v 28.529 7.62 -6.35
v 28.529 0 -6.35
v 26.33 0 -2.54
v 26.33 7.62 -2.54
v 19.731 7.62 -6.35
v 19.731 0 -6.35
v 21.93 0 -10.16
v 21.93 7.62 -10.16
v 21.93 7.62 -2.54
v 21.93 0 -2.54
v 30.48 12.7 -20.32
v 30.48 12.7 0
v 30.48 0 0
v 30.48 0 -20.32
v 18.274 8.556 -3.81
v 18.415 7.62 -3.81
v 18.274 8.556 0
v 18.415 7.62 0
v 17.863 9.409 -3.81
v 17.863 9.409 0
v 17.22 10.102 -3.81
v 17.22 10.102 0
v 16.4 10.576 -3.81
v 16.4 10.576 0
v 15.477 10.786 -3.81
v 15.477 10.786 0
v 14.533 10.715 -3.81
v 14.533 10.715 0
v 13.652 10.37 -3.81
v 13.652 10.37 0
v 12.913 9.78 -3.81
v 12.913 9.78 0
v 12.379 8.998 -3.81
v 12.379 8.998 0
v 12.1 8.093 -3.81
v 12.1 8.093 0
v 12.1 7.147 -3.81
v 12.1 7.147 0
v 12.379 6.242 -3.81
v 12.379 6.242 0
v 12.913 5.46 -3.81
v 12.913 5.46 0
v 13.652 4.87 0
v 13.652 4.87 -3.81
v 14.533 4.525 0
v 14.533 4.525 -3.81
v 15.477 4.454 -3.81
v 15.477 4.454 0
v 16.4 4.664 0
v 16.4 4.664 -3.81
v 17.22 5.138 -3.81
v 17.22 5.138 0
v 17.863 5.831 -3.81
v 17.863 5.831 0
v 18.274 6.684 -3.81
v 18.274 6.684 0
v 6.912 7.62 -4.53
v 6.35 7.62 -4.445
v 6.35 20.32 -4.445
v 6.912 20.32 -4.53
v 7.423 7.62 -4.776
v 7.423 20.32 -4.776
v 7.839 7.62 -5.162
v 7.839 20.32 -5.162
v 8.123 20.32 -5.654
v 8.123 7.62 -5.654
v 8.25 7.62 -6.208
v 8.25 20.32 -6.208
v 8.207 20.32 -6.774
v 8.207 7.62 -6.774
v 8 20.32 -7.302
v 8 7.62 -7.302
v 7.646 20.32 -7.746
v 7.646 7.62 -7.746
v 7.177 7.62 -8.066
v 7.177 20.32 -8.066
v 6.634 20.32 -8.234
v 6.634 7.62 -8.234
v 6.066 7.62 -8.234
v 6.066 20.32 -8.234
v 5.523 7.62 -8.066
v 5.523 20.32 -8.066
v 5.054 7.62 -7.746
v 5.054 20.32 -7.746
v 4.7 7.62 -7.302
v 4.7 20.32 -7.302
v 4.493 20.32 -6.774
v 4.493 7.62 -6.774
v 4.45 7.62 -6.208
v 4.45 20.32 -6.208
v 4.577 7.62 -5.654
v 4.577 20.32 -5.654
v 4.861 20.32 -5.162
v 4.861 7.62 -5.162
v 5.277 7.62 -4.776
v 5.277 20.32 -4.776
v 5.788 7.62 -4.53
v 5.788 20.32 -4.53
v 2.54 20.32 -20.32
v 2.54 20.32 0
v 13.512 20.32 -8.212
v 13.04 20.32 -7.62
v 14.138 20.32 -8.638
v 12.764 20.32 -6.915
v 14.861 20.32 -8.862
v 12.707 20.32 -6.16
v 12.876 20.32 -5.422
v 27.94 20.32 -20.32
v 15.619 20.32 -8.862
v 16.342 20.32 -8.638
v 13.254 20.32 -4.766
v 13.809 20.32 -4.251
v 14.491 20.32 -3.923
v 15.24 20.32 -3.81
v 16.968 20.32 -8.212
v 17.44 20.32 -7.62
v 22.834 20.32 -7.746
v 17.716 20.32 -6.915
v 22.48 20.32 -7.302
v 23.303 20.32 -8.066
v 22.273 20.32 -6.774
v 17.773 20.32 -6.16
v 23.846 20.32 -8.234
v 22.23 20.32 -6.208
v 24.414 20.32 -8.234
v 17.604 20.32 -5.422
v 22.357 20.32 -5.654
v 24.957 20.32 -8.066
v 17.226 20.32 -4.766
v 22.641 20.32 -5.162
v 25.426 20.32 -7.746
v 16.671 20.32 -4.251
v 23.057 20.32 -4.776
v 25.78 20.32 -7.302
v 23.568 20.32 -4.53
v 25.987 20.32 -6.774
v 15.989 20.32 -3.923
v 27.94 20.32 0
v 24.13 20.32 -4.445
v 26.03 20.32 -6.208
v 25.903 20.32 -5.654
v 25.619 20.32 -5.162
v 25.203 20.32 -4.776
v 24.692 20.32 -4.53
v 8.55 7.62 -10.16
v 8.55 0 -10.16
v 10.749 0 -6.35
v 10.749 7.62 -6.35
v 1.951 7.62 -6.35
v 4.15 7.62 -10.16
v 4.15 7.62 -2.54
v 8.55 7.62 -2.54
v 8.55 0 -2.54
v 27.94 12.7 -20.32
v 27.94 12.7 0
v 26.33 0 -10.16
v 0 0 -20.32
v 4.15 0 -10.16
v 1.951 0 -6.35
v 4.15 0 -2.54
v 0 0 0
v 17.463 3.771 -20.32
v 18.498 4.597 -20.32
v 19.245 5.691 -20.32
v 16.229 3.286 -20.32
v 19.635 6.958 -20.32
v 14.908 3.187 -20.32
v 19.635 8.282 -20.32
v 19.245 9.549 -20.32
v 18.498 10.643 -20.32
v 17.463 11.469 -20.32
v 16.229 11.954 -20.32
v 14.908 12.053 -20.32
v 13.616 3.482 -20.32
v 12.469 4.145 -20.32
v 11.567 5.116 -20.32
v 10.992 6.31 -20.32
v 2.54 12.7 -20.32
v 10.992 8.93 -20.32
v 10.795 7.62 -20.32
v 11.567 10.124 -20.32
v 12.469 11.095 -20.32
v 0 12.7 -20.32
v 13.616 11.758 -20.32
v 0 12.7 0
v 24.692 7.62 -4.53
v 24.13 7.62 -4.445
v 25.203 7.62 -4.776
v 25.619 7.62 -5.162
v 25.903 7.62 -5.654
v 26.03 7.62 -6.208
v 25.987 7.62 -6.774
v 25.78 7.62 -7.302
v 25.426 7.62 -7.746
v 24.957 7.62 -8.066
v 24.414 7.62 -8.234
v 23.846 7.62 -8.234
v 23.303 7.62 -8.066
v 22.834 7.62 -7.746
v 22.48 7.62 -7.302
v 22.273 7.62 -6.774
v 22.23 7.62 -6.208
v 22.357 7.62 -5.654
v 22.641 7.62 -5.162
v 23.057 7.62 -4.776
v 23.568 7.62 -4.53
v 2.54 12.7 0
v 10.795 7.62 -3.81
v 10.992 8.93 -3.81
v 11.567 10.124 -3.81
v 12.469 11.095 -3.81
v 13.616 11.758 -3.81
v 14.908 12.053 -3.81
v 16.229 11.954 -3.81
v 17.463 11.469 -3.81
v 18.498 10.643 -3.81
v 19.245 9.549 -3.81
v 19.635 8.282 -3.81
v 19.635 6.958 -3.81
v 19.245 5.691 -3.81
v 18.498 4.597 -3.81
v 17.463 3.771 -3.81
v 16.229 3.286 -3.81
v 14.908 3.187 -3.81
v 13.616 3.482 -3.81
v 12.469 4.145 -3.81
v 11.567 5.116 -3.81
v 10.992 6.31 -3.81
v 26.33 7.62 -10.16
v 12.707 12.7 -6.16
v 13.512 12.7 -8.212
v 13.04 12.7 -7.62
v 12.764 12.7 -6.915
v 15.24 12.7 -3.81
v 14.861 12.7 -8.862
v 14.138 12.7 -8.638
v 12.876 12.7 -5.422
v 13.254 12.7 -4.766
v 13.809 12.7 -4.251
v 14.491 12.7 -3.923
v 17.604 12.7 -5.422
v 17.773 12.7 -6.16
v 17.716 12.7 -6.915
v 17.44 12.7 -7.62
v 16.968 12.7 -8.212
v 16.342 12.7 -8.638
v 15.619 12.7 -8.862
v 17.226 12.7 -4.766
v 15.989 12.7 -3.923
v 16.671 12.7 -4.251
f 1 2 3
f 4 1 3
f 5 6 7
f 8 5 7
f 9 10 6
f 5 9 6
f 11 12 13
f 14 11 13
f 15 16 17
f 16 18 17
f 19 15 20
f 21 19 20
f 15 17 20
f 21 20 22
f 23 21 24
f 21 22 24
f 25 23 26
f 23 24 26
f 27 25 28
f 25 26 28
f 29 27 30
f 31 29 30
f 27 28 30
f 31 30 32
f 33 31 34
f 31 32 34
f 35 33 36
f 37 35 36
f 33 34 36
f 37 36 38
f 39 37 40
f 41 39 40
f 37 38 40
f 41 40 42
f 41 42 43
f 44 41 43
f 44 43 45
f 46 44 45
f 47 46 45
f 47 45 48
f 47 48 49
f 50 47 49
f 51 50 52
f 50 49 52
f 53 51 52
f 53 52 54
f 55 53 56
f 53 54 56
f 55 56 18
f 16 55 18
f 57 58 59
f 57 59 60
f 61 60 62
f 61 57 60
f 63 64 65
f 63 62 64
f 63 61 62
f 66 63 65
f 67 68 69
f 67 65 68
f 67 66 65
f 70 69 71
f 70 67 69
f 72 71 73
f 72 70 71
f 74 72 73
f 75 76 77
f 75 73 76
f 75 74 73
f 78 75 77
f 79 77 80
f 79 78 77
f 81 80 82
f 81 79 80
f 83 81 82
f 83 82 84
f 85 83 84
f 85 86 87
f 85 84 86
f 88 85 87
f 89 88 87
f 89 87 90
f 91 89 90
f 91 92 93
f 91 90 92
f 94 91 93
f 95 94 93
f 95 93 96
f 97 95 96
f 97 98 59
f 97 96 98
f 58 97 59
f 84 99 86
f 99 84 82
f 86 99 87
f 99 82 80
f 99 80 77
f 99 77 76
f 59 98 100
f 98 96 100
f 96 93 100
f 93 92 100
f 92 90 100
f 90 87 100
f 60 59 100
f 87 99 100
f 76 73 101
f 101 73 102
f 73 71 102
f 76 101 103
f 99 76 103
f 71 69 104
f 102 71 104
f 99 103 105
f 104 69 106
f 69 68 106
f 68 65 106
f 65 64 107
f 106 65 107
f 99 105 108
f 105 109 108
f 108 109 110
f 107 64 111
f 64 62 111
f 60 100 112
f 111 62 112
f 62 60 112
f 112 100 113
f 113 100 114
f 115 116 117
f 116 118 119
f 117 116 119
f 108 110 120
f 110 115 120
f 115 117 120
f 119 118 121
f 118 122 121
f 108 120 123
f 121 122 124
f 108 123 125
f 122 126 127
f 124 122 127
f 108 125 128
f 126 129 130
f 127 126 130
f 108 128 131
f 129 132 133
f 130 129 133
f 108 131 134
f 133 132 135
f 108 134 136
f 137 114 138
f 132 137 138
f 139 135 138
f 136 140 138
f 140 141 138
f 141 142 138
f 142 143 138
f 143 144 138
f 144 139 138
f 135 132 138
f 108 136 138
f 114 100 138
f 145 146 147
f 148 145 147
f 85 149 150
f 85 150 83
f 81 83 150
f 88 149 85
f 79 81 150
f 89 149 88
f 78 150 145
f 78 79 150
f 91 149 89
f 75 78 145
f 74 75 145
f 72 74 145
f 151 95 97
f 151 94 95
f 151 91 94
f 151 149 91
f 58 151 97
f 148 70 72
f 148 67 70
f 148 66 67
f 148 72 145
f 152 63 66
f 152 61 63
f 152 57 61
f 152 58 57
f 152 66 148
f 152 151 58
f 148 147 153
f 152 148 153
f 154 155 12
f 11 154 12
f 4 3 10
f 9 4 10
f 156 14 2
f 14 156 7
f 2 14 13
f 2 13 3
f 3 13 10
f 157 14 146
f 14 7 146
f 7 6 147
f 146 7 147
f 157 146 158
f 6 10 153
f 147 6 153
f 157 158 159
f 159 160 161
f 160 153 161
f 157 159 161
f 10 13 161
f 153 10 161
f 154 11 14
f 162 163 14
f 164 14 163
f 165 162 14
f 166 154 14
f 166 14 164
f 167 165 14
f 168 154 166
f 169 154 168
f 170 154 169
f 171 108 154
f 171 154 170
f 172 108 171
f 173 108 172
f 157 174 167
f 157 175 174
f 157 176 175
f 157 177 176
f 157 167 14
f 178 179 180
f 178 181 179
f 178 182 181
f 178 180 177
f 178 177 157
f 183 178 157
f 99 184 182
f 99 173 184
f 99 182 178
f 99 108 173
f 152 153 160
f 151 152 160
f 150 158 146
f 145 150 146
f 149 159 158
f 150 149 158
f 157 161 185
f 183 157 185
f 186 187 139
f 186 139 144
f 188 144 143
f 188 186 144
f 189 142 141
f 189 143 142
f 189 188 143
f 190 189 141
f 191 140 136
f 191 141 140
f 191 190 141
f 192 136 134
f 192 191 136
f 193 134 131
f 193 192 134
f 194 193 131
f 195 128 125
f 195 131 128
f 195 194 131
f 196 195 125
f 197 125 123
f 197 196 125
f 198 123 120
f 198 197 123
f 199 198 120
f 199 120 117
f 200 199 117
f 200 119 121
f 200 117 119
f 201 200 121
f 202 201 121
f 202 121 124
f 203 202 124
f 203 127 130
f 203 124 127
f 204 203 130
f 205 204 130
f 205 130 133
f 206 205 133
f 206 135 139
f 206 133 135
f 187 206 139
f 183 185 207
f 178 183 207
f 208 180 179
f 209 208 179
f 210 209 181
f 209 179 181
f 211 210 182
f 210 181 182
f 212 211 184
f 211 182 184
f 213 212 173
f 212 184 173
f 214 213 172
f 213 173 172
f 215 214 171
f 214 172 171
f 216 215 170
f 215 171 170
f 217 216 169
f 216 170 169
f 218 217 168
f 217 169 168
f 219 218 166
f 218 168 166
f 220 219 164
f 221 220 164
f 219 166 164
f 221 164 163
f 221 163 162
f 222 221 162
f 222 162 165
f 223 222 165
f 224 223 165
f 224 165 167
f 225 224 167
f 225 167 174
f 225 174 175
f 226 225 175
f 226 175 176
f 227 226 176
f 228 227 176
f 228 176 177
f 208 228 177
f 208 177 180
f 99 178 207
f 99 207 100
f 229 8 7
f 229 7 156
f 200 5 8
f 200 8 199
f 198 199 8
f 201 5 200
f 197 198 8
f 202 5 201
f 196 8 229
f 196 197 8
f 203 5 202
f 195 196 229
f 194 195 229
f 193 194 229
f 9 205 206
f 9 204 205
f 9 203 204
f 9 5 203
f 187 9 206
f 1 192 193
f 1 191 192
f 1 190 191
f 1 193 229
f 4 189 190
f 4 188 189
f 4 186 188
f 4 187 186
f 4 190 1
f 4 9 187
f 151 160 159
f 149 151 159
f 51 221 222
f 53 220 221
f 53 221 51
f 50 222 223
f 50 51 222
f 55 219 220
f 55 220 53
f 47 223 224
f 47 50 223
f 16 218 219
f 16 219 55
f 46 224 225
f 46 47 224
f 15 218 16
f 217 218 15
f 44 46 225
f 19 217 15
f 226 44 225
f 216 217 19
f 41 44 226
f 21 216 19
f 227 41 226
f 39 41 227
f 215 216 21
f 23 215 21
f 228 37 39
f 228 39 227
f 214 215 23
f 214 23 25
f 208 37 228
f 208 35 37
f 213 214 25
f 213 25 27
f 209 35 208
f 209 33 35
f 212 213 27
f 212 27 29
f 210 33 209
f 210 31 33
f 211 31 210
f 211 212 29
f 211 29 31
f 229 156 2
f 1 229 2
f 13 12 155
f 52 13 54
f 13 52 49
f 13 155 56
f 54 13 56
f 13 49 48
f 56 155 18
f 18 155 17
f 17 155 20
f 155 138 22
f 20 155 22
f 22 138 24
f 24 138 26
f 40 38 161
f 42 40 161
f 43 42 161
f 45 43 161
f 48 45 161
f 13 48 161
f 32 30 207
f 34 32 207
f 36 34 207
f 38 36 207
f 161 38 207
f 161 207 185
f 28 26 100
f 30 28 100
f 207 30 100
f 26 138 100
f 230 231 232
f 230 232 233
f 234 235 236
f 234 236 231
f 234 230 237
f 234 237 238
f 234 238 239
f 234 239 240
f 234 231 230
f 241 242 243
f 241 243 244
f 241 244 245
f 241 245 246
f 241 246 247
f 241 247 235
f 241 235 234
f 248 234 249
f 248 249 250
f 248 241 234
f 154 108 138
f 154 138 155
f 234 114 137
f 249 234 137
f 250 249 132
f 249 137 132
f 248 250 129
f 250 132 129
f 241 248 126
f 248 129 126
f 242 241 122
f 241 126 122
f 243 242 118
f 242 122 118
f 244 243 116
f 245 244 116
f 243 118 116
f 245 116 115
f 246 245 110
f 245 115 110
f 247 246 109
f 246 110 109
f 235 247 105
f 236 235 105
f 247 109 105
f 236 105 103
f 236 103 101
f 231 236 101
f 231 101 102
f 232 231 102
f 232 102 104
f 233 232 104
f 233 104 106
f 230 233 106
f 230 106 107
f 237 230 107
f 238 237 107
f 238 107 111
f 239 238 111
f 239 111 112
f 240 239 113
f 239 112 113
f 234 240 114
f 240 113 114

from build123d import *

# Parameters (mm, degrees)
BOSS_EXTRUDE1_DEPTH                                 = 20.32
CBORE_FOR_0_BINDING_HEAD_MACHINE_SCREW1_D           = 6.35
CBORE_FOR_0_BINDING_HEAD_MACHINE_SCREW1_CBORE_D     = 8.89
CBORE_FOR_0_BINDING_HEAD_MACHINE_SCREW1_CBORE_DEPTH = 16.51
CUT_EXTRUDE1_DEPTH                                  = 42.890753156
CUT_EXTRUDE1_DEPTH_BACK                             = 42.890753156
SKETCH5_R                                           = 1.905
SKETCH6_R                                           = 2.54
CUT_EXTRUDE2_DEPTH                                  = 7.62
CUT_EXTRUDE3_DEPTH                                  = 7.62


with BuildPart() as part:
    # Sketch1 → Boss-Extrude1 (new body)
    with BuildSketch(Plane.XY):
        Polygon((0, 0), (0, 12.7), (2.54, 12.7), (2.54, 20.32), (27.94, 20.32), (27.94, 12.7), (30.48, 12.7), (30.48, 0), align=None)
    extrude(amount=-BOSS_EXTRUDE1_DEPTH)

    # CBORE for #0 Binding Head Machine Screw1 (through all)
    with Locations(Plane(origin=(0, 0, -20.32), x_dir=(-1, 0, 0), z_dir=(0, 0, -1))):
        with Locations((-15.24, 7.62)):
            CounterBoreHole(CBORE_FOR_0_BINDING_HEAD_MACHINE_SCREW1_D / 2, CBORE_FOR_0_BINDING_HEAD_MACHINE_SCREW1_CBORE_D / 2, CBORE_FOR_0_BINDING_HEAD_MACHINE_SCREW1_CBORE_DEPTH)

    # Sketch5 → Cut-Extrude1 (cut, two sides: drawn at the far end of the back side and taken through both)
    with BuildSketch(Plane(origin=(0, 20.32, 0), x_dir=(1, 0, 0), z_dir=(0, 1, 0)).offset(-CUT_EXTRUDE1_DEPTH_BACK)):
        with Locations(Location((6.35, 6.35, 0), (0, 0, 270))):
            Circle(SKETCH5_R)
        with Locations(Location((24.13, 6.35, 0), (0, 0, 270))):
            Circle(SKETCH5_R)
    extrude(amount=CUT_EXTRUDE1_DEPTH + CUT_EXTRUDE1_DEPTH_BACK, mode=Mode.SUBTRACT)

    # Sketch6 → Cut-Extrude2 (cut)
    with BuildSketch(Plane(origin=(0, 20.32, 0), x_dir=(1, 0, 0), z_dir=(0, 1, 0))):
        with Locations(Location((15.24, 6.35, 0), (0, 0, 270))):
            Circle(SKETCH6_R)
    extrude(amount=-CUT_EXTRUDE2_DEPTH, mode=Mode.SUBTRACT)

    # Sketch7 → Cut-Extrude3 (cut)
    with BuildSketch(Plane.XZ):
        Polygon((1.950590949, -6.35), (4.150295474, -10.16), (8.549704526, -10.16), (10.749409051, -6.35), (8.549704526, -2.54), (4.150295474, -2.54), align=None)
        Polygon((19.730590949, -6.35), (21.930295474, -10.16), (26.329704526, -10.16), (28.529409051, -6.35), (26.329704526, -2.54), (21.930295474, -2.54), align=None)
    extrude(amount=-CUT_EXTRUDE3_DEPTH, mode=Mode.SUBTRACT)


solid = part.part
